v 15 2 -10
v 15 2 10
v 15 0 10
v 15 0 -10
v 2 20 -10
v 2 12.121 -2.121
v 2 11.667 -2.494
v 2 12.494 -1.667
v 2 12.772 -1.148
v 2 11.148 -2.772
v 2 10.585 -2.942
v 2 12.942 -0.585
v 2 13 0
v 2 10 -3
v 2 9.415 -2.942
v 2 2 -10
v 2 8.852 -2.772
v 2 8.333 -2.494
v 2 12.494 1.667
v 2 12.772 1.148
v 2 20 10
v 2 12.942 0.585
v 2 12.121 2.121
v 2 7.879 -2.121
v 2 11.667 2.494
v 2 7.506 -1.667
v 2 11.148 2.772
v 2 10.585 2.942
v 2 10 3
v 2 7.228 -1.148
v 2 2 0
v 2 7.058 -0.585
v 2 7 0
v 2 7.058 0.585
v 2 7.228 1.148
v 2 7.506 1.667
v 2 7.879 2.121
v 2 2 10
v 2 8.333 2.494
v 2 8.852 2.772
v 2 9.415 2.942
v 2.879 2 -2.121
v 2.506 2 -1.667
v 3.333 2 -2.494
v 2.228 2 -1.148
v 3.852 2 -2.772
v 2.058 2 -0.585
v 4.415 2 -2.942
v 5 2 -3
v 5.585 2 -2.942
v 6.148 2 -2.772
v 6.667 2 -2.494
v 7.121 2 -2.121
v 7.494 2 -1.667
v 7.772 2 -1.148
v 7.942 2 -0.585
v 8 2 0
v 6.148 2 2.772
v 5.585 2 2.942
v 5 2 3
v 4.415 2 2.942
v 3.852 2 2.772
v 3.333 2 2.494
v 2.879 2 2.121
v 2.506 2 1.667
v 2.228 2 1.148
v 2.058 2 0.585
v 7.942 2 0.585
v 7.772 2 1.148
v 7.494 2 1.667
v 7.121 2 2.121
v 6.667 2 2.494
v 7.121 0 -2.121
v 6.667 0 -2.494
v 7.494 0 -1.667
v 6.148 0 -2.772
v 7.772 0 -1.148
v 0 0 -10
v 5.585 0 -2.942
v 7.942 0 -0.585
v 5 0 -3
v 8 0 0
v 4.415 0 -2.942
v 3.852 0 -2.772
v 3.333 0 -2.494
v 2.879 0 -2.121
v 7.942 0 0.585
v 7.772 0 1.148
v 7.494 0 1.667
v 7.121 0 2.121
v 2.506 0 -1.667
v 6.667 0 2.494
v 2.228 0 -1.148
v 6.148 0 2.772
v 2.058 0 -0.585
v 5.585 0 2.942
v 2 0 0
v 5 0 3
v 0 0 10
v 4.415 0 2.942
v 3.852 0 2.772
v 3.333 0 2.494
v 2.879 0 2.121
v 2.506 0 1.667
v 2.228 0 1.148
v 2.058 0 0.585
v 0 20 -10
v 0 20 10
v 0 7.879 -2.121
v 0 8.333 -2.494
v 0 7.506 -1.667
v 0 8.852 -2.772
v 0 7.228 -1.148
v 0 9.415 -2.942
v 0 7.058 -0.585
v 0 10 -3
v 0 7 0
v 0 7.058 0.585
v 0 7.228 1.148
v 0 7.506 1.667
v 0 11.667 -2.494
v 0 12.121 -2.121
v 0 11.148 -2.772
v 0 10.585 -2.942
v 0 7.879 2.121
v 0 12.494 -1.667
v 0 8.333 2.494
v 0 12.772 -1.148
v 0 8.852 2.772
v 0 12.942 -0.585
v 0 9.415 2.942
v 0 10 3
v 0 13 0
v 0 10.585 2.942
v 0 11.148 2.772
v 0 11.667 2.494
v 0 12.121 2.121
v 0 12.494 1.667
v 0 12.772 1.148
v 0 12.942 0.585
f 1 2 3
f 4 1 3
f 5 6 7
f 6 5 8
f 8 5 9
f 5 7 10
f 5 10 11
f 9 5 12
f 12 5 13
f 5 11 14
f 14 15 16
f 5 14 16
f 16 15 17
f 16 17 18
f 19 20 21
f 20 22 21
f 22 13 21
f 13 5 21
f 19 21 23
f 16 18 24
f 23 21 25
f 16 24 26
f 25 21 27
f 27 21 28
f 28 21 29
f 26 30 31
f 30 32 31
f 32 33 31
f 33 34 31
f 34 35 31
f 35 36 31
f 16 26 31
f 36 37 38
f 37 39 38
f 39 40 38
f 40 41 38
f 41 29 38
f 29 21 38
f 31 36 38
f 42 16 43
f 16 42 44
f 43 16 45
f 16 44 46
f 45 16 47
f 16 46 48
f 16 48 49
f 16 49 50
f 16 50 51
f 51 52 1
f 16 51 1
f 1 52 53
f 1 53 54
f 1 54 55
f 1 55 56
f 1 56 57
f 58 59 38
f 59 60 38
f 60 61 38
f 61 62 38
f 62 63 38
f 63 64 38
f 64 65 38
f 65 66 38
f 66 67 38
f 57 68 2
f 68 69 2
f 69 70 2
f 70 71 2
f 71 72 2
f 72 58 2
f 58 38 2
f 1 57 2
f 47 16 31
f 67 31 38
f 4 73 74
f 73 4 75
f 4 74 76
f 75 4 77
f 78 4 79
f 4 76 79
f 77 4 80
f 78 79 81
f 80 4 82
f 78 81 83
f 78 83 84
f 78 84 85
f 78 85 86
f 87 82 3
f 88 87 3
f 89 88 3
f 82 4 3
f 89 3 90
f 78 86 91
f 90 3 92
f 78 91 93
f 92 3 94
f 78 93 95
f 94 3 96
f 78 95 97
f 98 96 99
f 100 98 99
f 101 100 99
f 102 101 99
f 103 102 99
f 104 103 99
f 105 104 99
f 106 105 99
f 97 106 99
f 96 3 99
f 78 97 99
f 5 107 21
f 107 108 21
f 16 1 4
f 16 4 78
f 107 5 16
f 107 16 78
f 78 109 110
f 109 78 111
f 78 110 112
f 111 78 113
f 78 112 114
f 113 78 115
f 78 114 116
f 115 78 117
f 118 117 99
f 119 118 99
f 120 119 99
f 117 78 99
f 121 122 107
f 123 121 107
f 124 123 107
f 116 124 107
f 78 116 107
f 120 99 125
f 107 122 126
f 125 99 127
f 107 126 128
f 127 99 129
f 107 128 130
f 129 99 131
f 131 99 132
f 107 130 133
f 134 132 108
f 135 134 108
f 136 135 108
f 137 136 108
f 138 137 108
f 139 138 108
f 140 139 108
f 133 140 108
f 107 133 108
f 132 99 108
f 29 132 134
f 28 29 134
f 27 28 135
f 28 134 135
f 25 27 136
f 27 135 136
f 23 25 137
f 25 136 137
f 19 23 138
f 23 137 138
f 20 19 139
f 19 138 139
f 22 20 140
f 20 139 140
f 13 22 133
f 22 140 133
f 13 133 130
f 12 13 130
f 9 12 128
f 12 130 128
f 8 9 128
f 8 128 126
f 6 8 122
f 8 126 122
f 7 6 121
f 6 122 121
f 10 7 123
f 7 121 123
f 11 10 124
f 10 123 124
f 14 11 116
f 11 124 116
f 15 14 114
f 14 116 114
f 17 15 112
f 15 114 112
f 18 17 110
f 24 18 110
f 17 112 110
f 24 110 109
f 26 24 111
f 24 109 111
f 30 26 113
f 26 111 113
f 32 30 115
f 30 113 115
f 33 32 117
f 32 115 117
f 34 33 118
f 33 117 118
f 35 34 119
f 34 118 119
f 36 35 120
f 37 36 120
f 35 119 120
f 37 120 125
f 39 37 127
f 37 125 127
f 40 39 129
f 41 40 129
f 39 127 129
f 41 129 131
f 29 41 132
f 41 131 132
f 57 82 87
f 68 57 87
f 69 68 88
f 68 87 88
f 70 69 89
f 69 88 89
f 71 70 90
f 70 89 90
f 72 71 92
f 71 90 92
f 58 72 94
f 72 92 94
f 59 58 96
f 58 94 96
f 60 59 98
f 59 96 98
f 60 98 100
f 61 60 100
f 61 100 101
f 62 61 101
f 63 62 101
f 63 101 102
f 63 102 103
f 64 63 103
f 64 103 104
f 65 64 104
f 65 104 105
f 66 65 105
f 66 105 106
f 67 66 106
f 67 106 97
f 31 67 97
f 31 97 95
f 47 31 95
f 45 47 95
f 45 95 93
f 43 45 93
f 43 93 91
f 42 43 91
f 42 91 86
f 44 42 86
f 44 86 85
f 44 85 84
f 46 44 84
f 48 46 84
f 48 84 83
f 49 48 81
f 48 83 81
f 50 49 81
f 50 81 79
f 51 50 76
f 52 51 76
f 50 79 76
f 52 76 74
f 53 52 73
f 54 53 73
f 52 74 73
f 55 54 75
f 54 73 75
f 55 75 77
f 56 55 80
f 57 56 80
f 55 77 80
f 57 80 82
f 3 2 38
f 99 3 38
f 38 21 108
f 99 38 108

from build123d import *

# Parameters (mm, degrees)
EXTRUDE_1_DEPTH     = 10
SKETCH_2_R          = 3
CUT_EXTRUDE_1_DEPTH = 2
SKETCH_3_R          = 3
CUT_EXTRUDE_2_DEPTH = 2


with BuildPart() as part:
    # 草图1 → 凸台-拉伸1 (new, symmetric)
    with BuildSketch(Plane.XY):
        Polygon((0, 0), (0, 20), (2, 20), (2, 2), (15, 2), (15, 0), align=None)
    extrude(amount=EXTRUDE_1_DEPTH, both=True)

    # 草图2 → 切除-拉伸1 (cut)
    with BuildSketch(Plane.ZY):
        with Locations((0, 10)):
            Circle(SKETCH_2_R)
    extrude(amount=-CUT_EXTRUDE_1_DEPTH, mode=Mode.SUBTRACT)

    # 草图3 → 切除-拉伸2 (cut)
    with BuildSketch(Plane.XZ):
        with Locations((5, 0)):
            Circle(SKETCH_3_R)
    extrude(amount=-CUT_EXTRUDE_2_DEPTH, mode=Mode.SUBTRACT)


solid = part.part
